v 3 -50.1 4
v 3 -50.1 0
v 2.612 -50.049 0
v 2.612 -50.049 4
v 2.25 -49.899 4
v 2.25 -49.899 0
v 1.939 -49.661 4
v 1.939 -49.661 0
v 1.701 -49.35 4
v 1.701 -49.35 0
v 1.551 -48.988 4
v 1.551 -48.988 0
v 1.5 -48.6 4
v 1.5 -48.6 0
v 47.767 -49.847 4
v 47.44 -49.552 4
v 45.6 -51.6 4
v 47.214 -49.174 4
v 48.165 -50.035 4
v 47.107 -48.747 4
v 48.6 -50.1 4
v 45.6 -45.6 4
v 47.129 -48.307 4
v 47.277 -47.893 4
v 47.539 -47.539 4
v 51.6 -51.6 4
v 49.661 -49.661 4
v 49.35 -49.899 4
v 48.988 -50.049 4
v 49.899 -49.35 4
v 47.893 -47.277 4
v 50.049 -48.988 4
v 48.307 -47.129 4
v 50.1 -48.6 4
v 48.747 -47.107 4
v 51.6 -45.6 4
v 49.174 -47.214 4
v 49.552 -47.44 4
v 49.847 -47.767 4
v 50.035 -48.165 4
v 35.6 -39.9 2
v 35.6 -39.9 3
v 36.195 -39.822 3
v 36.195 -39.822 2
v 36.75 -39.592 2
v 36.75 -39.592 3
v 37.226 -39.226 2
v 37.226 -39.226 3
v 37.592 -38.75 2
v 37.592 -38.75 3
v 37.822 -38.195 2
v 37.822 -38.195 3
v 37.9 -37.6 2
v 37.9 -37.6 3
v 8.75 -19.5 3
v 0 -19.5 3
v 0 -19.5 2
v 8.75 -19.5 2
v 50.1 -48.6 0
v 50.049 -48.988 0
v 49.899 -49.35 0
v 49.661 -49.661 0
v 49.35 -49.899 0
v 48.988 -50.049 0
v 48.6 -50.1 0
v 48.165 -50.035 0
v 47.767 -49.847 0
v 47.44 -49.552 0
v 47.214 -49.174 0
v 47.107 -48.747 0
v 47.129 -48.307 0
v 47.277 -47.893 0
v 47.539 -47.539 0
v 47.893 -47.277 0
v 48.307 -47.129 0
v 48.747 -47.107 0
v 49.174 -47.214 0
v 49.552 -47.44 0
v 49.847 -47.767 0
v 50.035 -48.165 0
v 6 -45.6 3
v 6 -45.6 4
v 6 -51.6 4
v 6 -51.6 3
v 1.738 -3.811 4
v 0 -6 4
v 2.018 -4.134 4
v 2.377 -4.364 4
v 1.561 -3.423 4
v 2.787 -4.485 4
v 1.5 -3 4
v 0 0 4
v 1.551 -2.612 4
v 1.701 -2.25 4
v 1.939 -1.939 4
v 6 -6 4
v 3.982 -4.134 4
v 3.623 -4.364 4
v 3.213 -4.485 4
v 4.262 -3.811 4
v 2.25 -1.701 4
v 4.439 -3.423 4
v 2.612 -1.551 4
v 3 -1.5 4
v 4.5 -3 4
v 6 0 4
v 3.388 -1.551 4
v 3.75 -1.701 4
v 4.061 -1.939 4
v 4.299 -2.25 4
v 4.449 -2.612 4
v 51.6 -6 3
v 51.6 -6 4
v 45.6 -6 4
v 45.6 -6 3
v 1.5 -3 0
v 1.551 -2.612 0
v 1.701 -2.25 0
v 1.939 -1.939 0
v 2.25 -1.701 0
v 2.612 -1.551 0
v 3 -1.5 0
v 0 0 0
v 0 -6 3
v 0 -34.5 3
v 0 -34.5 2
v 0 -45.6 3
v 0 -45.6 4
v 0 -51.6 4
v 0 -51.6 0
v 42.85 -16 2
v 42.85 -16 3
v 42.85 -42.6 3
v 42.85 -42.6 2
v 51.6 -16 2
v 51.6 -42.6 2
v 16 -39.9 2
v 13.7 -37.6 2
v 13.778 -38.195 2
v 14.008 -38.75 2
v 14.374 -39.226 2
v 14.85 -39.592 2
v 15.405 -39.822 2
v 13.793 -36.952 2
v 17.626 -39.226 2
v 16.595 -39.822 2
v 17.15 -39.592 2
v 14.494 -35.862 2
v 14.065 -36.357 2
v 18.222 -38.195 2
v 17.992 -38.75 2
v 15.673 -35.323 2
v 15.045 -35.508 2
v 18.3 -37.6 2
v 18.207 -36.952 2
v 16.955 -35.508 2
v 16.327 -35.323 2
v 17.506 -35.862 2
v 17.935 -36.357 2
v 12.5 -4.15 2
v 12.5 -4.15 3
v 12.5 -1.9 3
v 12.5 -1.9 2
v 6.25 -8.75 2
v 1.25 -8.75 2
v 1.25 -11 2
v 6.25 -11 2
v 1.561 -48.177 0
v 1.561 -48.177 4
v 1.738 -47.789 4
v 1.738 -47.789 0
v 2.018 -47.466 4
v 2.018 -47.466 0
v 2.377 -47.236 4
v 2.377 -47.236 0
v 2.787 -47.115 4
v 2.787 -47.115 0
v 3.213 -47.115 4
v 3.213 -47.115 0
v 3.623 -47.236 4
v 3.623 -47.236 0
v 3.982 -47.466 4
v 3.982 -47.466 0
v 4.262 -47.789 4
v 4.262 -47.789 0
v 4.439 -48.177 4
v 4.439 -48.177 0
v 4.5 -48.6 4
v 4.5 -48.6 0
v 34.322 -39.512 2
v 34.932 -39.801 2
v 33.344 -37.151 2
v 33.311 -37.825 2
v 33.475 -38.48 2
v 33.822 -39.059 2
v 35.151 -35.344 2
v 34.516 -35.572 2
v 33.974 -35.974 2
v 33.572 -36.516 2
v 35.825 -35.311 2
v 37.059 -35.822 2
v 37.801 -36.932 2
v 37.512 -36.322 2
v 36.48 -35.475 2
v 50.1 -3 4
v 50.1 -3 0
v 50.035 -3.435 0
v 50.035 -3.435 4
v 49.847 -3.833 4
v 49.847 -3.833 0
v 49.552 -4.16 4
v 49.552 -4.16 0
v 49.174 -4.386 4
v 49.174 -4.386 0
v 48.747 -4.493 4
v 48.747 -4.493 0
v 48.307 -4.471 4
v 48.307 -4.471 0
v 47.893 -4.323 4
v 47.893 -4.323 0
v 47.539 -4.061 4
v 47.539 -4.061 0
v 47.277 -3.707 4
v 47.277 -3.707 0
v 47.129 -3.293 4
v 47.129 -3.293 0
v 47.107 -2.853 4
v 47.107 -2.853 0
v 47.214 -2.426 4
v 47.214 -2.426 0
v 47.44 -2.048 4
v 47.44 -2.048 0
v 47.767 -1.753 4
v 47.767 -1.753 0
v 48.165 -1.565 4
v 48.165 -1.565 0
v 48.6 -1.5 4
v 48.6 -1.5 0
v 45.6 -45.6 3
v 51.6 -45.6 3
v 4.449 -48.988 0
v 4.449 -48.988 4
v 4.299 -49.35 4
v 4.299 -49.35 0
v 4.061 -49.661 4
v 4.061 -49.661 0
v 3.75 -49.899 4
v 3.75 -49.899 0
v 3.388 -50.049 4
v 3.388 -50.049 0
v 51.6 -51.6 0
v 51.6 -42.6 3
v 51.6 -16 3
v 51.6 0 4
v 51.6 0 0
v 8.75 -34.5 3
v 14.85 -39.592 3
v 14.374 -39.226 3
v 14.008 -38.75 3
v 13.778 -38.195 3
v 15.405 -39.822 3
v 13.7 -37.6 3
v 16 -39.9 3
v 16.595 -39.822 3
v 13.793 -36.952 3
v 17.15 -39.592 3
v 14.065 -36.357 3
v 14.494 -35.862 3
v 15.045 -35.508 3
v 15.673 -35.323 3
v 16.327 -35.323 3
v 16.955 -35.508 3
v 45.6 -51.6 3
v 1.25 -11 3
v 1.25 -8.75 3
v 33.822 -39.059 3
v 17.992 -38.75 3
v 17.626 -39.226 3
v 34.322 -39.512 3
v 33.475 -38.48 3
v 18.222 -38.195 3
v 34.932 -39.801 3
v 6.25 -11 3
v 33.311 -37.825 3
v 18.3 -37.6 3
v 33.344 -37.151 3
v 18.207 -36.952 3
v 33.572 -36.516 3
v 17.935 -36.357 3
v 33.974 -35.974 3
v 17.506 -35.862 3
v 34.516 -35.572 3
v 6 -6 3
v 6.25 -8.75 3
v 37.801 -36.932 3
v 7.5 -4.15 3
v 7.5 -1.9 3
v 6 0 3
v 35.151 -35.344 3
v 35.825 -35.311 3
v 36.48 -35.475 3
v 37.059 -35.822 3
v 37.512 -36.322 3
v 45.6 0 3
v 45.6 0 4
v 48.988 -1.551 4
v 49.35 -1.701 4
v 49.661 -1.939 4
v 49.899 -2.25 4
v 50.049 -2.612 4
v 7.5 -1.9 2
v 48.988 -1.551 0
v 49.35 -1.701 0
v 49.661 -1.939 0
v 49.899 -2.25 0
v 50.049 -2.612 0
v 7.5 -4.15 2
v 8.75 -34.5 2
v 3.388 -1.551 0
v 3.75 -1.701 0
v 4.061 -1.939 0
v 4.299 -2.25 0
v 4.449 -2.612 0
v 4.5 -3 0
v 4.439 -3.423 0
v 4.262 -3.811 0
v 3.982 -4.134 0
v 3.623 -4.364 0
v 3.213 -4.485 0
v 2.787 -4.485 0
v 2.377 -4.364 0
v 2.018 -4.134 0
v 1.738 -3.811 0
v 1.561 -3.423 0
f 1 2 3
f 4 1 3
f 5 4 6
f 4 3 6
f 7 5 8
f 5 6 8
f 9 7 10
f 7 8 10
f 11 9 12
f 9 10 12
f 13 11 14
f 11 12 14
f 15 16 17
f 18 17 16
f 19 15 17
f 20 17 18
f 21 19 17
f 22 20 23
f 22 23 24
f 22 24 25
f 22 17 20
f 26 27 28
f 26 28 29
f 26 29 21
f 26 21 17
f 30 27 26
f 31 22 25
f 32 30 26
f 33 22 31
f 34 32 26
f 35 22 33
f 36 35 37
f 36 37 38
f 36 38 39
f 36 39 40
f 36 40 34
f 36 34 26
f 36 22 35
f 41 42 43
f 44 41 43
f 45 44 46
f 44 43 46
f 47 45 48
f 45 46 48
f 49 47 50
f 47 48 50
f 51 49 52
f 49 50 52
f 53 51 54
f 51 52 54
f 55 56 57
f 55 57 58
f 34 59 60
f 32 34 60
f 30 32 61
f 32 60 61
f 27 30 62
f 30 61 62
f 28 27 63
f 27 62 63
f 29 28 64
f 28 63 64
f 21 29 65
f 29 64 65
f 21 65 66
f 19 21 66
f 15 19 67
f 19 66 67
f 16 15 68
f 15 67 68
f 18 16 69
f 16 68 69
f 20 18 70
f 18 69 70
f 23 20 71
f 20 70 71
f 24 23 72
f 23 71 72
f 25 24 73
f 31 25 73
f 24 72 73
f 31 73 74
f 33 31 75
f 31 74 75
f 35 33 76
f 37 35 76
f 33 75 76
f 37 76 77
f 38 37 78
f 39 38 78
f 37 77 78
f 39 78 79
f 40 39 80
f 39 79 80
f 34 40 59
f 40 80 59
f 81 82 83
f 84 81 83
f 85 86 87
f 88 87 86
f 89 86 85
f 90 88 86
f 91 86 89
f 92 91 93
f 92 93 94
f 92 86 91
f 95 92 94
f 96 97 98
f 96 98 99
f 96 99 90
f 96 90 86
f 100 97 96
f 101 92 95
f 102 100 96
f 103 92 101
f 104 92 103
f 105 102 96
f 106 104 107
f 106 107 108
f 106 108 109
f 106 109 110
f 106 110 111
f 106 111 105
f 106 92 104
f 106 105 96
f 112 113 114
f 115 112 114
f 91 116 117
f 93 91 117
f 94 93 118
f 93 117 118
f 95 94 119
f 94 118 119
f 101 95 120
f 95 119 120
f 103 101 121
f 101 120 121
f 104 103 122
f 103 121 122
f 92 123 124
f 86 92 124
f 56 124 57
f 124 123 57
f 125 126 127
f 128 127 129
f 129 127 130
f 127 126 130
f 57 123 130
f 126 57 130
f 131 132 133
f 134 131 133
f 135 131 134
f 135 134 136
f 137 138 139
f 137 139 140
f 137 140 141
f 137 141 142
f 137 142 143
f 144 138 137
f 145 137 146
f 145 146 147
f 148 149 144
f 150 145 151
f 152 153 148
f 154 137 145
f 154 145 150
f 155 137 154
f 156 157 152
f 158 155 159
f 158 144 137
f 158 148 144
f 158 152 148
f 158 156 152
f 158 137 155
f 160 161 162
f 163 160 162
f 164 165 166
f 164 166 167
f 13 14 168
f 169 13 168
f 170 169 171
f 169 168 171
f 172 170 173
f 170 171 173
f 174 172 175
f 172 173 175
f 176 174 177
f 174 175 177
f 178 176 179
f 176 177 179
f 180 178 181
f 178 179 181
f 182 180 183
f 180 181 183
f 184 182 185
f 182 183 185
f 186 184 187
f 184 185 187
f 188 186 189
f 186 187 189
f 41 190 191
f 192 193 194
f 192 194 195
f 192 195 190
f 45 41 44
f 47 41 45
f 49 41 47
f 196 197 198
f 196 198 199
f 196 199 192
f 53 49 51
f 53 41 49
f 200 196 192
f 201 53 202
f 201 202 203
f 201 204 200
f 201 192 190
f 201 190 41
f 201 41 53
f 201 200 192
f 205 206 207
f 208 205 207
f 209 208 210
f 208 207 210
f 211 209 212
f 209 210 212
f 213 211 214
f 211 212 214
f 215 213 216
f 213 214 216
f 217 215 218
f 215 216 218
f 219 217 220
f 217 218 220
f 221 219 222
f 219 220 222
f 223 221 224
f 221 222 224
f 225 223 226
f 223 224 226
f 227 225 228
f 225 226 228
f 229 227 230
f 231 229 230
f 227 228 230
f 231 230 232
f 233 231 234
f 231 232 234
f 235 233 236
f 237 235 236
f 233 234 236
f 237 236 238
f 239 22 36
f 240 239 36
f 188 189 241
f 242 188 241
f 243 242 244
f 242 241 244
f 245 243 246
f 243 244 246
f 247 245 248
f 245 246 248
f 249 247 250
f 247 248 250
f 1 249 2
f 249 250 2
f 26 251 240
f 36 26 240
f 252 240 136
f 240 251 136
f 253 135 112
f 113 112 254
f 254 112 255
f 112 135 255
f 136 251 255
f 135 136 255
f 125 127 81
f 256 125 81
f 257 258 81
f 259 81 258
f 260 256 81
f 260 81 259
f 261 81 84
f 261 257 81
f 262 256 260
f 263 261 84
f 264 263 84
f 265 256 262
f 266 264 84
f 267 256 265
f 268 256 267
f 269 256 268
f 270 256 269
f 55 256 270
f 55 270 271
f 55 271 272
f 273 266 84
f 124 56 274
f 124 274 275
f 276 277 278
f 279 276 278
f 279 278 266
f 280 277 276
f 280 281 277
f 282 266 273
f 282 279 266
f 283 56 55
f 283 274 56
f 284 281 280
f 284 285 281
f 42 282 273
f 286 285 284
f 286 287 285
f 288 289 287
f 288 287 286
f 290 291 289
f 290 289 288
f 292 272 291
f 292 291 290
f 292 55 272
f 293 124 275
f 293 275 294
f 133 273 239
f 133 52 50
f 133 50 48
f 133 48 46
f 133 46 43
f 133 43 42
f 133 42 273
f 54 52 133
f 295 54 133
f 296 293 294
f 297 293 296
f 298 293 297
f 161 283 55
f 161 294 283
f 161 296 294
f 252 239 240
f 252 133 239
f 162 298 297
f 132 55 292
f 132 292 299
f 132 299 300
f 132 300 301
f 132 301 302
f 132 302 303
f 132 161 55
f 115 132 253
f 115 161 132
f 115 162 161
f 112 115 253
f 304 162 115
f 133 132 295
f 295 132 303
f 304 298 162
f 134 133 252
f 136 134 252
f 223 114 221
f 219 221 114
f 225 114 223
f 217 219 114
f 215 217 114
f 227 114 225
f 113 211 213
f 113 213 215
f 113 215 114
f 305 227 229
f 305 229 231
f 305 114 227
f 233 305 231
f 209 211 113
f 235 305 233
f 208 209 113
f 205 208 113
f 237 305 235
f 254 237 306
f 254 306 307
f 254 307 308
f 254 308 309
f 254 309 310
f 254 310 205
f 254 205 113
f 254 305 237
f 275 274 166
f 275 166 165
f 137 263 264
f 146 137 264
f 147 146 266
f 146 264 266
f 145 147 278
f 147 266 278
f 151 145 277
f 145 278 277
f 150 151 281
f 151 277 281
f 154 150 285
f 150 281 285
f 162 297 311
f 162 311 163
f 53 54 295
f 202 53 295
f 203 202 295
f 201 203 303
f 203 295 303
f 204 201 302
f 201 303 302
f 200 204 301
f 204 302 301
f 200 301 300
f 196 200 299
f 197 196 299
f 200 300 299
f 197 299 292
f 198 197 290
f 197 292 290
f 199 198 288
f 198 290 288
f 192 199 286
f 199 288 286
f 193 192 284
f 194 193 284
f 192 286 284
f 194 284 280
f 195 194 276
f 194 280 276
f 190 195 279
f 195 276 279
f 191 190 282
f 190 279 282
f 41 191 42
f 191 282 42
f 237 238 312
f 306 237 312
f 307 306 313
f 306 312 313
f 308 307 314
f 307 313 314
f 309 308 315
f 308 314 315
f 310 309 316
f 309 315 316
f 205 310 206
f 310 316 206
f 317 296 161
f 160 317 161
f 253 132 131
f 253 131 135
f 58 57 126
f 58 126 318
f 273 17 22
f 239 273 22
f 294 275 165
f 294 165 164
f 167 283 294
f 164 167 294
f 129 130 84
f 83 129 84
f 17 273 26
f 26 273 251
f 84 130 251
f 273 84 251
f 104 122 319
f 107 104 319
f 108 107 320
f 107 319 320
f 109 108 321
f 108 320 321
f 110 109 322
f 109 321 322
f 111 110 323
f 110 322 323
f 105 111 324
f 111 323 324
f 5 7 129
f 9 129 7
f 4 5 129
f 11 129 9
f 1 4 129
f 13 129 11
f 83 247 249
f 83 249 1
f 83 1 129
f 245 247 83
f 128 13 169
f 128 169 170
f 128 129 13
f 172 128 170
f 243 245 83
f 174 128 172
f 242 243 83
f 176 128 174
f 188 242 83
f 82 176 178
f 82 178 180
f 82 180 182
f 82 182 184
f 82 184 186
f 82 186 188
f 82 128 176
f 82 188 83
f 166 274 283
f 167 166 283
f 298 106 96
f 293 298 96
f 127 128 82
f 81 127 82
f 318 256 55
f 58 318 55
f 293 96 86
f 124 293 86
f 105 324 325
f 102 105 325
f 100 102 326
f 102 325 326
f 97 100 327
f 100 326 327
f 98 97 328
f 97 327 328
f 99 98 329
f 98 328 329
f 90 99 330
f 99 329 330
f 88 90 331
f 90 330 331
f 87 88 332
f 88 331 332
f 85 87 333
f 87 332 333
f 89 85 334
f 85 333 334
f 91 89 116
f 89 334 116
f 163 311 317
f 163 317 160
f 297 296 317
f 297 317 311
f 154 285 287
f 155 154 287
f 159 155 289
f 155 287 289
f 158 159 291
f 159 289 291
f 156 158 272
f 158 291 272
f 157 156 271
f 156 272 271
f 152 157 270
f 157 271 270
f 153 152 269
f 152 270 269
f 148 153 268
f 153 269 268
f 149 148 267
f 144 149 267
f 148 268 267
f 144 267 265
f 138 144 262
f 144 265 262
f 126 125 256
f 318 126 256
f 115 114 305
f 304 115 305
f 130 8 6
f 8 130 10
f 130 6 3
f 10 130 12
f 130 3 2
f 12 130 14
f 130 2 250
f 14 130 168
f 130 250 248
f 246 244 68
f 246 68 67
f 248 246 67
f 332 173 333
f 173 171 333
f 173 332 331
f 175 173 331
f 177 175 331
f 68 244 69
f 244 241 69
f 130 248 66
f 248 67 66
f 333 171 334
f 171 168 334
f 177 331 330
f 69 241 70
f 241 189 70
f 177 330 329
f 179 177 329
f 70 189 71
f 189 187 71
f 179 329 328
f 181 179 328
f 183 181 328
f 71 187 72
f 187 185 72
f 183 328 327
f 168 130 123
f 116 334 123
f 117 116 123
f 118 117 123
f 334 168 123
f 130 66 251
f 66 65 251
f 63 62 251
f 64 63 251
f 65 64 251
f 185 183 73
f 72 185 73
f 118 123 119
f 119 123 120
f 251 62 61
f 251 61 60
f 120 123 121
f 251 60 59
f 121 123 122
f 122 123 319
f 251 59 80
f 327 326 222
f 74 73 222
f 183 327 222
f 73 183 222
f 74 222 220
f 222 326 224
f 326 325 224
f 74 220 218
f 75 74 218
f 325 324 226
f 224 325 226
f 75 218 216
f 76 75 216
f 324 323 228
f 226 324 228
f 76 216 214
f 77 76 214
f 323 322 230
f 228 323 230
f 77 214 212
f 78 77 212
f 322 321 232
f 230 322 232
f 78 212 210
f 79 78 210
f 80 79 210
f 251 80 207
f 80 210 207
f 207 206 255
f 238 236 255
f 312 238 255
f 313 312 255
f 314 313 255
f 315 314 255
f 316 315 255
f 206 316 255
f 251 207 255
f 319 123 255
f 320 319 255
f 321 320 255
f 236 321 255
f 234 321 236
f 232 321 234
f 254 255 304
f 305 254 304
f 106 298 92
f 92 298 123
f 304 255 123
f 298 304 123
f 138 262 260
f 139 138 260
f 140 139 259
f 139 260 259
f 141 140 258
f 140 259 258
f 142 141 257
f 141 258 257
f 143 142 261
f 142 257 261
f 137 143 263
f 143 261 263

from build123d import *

# Parameters (mm, degrees)
F1_DEPTH = 4
F2_W     = 5
F2_H     = 2.25
F2_W_2   = 8.75
F2_H_2   = 15
F2_H_3   = 21.6
F2_H_4   = 5
F3_DEPTH = 2
F4_DEPTH = 1


with BuildPart() as f1:
    # F0 (on Top) → F1 (new body)
    with BuildSketch(Plane.XY):
        with BuildLine():
            Line((48.6, 0), (3, 0))
            Line((3, 0), (3, -1.5))
            ThreePointArc((3, -1.5), (4.06066, -1.93934), (4.5, -3))
            ThreePointArc((4.5, -3), (3, -4.5), (1.5, -3))
            Line((1.5, -3), (0, -3))
            Line((0, -3), (0, -48.6))
            Line((0, -48.6), (1.5, -48.6))
            ThreePointArc((1.5, -48.6), (3, -47.1), (4.5, -48.6))
            ThreePointArc((4.5, -48.6), (4.06066, -49.66066), (3, -50.1))
            Line((3, -50.1), (3, -51.6))
            Line((3, -51.6), (48.6, -51.6))
            Line((48.6, -51.6), (48.6, -50.1))
            ThreePointArc((48.6, -50.1), (47.53934, -47.53934), (50.1, -48.6))
            Line((50.1, -48.6), (51.6, -48.6))
            Line((51.6, -48.6), (51.6, -3))
            Line((51.6, -3), (50.1, -3))
            ThreePointArc((50.1, -3), (47.53934, -4.06066), (48.6, -1.5))
            Line((48.6, -1.5), (48.6, 0))
        make_face()
        with BuildLine():
            Line((1.5, -48.6), (0, -48.6))
            Line((0, -48.6), (0, -51.6))
            Line((0, -51.6), (3, -51.6))
            Line((3, -51.6), (3, -50.1))
            ThreePointArc((3, -50.1), (1.93934, -49.66066), (1.5, -48.6))
        make_face()
        with BuildLine():
            Line((51.6, -51.6), (51.6, -48.6))
            Line((51.6, -48.6), (50.1, -48.6))
            ThreePointArc((50.1, -48.6), (49.66066, -49.66066), (48.6, -50.1))
            Line((48.6, -50.1), (48.6, -51.6))
            Line((48.6, -51.6), (51.6, -51.6))
        make_face()
        with BuildLine():
            Line((51.6, 0), (48.6, 0))
            Line((48.6, 0), (48.6, -1.5))
            ThreePointArc((48.6, -1.5), (49.66066, -1.93934), (50.1, -3))
            Line((50.1, -3), (51.6, -3))
            Line((51.6, -3), (51.6, 0))
        make_face()
        with BuildLine():
            Line((3, 0), (0, 0))
            Line((0, 0), (0, -3))
            Line((0, -3), (1.5, -3))
            ThreePointArc((1.5, -3), (1.93934, -1.93934), (3, -1.5))
            Line((3, -1.5), (3, 0))
        make_face()
    extrude(amount=F1_DEPTH)

    # F2 (on face) → F3 (cut)
    with BuildSketch(Plane.XY.offset(4)):
        with Locations((3.75, -9.875)):
            Rectangle(F2_W, F2_H)
        with Locations((4.375, -27)):
            Rectangle(F2_W_2, F2_H_2)
        with BuildLine():
            Line((16, -37.6), (13.7, -37.6))
            ThreePointArc((13.7, -37.6), (14.373654, -39.226346), (16, -39.9))
            Line((16, -39.9), (16, -37.6))
        make_face()
        with BuildLine():
            ThreePointArc((18.3, -37.6), (16, -35.3), (13.7, -37.6))
            Line((13.7, -37.6), (16, -37.6))
            Line((16, -37.6), (16, -39.9))
            ThreePointArc((16, -39.9), (17.626346, -39.226346), (18.3, -37.6))
        make_face()
        with BuildLine():
            ThreePointArc((37.9, -37.6), (33.973654, -35.973654), (35.6, -39.9))
            Line((35.6, -39.9), (35.6, -37.6))
            Line((35.6, -37.6), (37.9, -37.6))
        make_face()
        with BuildLine():
            Line((35.6, -37.6), (35.6, -39.9))
            ThreePointArc((35.6, -39.9), (37.226346, -39.226346), (37.9, -37.6))
            Line((37.9, -37.6), (35.6, -37.6))
        make_face()
        with Locations((47.225, -26.8)):
            Rectangle(F2_W_2, F2_H_3)
        with Locations((47.225, -40.1)):
            Rectangle(F2_W_2, F2_H_4)
        with Locations((10, -3.025)):
            Rectangle(F2_W, F2_H)
    extrude(amount=-F3_DEPTH, mode=Mode.SUBTRACT)

    # F2 (on face) → F4 (cut)
    with BuildSketch(Plane.XY.offset(4)):
        with BuildLine():
            Line((13.7, -37.6), (0, -37.6))
            Line((0, -37.6), (0, -45.6))
            Line((0, -45.6), (6, -45.6))
            Line((6, -45.6), (6, -51.6))
            Line((6, -51.6), (16, -51.6))
            Line((16, -51.6), (16, -39.9))
            ThreePointArc((16, -39.9), (14.373654, -39.226346), (13.7, -37.6))
        make_face()
        with BuildLine():
            Line((6, -6), (0, -6))
            Line((0, -6), (0, -19.5))
            Line((0, -19.5), (8.75, -19.5))
            Line((8.75, -19.5), (8.75, -34.5))
            Line((8.75, -34.5), (0, -34.5))
            Line((0, -34.5), (0, -37.6))
            Line((0, -37.6), (13.7, -37.6))
            ThreePointArc((13.7, -37.6), (16, -35.3), (18.3, -37.6))
            ThreePointArc((18.3, -37.6), (17.626346, -39.226346), (16, -39.9))
            Line((16, -39.9), (16, -51.6))
            Line((16, -51.6), (35.6, -51.6))
            Line((35.6, -51.6), (35.6, -39.9))
            ThreePointArc((35.6, -39.9), (33.973654, -35.973654), (37.9, -37.6))
            Line((37.9, -37.6), (42.85, -37.6))
            Line((42.85, -37.6), (42.85, -16))
            Line((42.85, -16), (51.6, -16))
            Line((51.6, -16), (51.6, -6))
            Line((51.6, -6), (45.6, -6))
            Line((45.6, -6), (45.6, 0))
            Line((45.6, 0), (6, 0))
            Line((6, 0), (6, -6))
        make_face()
        with Locations((3.75, -9.875)):
            Rectangle(F2_W, F2_H, mode=Mode.SUBTRACT)
        with Locations((10, -3.025)):
            Rectangle(F2_W, F2_H, mode=Mode.SUBTRACT)
        with BuildLine():
            Line((35.6, -39.9), (35.6, -51.6))
            Line((35.6, -51.6), (45.6, -51.6))
            Line((45.6, -51.6), (45.6, -45.6))
            Line((45.6, -45.6), (51.6, -45.6))
            Line((51.6, -45.6), (51.6, -42.6))
            Line((51.6, -42.6), (42.85, -42.6))
            Line((42.85, -42.6), (42.85, -37.6))
            Line((42.85, -37.6), (37.9, -37.6))
            ThreePointArc((37.9, -37.6), (37.226346, -39.226346), (35.6, -39.9))
        make_face()
    extrude(amount=-F4_DEPTH, mode=Mode.SUBTRACT)


solid = f1.part
